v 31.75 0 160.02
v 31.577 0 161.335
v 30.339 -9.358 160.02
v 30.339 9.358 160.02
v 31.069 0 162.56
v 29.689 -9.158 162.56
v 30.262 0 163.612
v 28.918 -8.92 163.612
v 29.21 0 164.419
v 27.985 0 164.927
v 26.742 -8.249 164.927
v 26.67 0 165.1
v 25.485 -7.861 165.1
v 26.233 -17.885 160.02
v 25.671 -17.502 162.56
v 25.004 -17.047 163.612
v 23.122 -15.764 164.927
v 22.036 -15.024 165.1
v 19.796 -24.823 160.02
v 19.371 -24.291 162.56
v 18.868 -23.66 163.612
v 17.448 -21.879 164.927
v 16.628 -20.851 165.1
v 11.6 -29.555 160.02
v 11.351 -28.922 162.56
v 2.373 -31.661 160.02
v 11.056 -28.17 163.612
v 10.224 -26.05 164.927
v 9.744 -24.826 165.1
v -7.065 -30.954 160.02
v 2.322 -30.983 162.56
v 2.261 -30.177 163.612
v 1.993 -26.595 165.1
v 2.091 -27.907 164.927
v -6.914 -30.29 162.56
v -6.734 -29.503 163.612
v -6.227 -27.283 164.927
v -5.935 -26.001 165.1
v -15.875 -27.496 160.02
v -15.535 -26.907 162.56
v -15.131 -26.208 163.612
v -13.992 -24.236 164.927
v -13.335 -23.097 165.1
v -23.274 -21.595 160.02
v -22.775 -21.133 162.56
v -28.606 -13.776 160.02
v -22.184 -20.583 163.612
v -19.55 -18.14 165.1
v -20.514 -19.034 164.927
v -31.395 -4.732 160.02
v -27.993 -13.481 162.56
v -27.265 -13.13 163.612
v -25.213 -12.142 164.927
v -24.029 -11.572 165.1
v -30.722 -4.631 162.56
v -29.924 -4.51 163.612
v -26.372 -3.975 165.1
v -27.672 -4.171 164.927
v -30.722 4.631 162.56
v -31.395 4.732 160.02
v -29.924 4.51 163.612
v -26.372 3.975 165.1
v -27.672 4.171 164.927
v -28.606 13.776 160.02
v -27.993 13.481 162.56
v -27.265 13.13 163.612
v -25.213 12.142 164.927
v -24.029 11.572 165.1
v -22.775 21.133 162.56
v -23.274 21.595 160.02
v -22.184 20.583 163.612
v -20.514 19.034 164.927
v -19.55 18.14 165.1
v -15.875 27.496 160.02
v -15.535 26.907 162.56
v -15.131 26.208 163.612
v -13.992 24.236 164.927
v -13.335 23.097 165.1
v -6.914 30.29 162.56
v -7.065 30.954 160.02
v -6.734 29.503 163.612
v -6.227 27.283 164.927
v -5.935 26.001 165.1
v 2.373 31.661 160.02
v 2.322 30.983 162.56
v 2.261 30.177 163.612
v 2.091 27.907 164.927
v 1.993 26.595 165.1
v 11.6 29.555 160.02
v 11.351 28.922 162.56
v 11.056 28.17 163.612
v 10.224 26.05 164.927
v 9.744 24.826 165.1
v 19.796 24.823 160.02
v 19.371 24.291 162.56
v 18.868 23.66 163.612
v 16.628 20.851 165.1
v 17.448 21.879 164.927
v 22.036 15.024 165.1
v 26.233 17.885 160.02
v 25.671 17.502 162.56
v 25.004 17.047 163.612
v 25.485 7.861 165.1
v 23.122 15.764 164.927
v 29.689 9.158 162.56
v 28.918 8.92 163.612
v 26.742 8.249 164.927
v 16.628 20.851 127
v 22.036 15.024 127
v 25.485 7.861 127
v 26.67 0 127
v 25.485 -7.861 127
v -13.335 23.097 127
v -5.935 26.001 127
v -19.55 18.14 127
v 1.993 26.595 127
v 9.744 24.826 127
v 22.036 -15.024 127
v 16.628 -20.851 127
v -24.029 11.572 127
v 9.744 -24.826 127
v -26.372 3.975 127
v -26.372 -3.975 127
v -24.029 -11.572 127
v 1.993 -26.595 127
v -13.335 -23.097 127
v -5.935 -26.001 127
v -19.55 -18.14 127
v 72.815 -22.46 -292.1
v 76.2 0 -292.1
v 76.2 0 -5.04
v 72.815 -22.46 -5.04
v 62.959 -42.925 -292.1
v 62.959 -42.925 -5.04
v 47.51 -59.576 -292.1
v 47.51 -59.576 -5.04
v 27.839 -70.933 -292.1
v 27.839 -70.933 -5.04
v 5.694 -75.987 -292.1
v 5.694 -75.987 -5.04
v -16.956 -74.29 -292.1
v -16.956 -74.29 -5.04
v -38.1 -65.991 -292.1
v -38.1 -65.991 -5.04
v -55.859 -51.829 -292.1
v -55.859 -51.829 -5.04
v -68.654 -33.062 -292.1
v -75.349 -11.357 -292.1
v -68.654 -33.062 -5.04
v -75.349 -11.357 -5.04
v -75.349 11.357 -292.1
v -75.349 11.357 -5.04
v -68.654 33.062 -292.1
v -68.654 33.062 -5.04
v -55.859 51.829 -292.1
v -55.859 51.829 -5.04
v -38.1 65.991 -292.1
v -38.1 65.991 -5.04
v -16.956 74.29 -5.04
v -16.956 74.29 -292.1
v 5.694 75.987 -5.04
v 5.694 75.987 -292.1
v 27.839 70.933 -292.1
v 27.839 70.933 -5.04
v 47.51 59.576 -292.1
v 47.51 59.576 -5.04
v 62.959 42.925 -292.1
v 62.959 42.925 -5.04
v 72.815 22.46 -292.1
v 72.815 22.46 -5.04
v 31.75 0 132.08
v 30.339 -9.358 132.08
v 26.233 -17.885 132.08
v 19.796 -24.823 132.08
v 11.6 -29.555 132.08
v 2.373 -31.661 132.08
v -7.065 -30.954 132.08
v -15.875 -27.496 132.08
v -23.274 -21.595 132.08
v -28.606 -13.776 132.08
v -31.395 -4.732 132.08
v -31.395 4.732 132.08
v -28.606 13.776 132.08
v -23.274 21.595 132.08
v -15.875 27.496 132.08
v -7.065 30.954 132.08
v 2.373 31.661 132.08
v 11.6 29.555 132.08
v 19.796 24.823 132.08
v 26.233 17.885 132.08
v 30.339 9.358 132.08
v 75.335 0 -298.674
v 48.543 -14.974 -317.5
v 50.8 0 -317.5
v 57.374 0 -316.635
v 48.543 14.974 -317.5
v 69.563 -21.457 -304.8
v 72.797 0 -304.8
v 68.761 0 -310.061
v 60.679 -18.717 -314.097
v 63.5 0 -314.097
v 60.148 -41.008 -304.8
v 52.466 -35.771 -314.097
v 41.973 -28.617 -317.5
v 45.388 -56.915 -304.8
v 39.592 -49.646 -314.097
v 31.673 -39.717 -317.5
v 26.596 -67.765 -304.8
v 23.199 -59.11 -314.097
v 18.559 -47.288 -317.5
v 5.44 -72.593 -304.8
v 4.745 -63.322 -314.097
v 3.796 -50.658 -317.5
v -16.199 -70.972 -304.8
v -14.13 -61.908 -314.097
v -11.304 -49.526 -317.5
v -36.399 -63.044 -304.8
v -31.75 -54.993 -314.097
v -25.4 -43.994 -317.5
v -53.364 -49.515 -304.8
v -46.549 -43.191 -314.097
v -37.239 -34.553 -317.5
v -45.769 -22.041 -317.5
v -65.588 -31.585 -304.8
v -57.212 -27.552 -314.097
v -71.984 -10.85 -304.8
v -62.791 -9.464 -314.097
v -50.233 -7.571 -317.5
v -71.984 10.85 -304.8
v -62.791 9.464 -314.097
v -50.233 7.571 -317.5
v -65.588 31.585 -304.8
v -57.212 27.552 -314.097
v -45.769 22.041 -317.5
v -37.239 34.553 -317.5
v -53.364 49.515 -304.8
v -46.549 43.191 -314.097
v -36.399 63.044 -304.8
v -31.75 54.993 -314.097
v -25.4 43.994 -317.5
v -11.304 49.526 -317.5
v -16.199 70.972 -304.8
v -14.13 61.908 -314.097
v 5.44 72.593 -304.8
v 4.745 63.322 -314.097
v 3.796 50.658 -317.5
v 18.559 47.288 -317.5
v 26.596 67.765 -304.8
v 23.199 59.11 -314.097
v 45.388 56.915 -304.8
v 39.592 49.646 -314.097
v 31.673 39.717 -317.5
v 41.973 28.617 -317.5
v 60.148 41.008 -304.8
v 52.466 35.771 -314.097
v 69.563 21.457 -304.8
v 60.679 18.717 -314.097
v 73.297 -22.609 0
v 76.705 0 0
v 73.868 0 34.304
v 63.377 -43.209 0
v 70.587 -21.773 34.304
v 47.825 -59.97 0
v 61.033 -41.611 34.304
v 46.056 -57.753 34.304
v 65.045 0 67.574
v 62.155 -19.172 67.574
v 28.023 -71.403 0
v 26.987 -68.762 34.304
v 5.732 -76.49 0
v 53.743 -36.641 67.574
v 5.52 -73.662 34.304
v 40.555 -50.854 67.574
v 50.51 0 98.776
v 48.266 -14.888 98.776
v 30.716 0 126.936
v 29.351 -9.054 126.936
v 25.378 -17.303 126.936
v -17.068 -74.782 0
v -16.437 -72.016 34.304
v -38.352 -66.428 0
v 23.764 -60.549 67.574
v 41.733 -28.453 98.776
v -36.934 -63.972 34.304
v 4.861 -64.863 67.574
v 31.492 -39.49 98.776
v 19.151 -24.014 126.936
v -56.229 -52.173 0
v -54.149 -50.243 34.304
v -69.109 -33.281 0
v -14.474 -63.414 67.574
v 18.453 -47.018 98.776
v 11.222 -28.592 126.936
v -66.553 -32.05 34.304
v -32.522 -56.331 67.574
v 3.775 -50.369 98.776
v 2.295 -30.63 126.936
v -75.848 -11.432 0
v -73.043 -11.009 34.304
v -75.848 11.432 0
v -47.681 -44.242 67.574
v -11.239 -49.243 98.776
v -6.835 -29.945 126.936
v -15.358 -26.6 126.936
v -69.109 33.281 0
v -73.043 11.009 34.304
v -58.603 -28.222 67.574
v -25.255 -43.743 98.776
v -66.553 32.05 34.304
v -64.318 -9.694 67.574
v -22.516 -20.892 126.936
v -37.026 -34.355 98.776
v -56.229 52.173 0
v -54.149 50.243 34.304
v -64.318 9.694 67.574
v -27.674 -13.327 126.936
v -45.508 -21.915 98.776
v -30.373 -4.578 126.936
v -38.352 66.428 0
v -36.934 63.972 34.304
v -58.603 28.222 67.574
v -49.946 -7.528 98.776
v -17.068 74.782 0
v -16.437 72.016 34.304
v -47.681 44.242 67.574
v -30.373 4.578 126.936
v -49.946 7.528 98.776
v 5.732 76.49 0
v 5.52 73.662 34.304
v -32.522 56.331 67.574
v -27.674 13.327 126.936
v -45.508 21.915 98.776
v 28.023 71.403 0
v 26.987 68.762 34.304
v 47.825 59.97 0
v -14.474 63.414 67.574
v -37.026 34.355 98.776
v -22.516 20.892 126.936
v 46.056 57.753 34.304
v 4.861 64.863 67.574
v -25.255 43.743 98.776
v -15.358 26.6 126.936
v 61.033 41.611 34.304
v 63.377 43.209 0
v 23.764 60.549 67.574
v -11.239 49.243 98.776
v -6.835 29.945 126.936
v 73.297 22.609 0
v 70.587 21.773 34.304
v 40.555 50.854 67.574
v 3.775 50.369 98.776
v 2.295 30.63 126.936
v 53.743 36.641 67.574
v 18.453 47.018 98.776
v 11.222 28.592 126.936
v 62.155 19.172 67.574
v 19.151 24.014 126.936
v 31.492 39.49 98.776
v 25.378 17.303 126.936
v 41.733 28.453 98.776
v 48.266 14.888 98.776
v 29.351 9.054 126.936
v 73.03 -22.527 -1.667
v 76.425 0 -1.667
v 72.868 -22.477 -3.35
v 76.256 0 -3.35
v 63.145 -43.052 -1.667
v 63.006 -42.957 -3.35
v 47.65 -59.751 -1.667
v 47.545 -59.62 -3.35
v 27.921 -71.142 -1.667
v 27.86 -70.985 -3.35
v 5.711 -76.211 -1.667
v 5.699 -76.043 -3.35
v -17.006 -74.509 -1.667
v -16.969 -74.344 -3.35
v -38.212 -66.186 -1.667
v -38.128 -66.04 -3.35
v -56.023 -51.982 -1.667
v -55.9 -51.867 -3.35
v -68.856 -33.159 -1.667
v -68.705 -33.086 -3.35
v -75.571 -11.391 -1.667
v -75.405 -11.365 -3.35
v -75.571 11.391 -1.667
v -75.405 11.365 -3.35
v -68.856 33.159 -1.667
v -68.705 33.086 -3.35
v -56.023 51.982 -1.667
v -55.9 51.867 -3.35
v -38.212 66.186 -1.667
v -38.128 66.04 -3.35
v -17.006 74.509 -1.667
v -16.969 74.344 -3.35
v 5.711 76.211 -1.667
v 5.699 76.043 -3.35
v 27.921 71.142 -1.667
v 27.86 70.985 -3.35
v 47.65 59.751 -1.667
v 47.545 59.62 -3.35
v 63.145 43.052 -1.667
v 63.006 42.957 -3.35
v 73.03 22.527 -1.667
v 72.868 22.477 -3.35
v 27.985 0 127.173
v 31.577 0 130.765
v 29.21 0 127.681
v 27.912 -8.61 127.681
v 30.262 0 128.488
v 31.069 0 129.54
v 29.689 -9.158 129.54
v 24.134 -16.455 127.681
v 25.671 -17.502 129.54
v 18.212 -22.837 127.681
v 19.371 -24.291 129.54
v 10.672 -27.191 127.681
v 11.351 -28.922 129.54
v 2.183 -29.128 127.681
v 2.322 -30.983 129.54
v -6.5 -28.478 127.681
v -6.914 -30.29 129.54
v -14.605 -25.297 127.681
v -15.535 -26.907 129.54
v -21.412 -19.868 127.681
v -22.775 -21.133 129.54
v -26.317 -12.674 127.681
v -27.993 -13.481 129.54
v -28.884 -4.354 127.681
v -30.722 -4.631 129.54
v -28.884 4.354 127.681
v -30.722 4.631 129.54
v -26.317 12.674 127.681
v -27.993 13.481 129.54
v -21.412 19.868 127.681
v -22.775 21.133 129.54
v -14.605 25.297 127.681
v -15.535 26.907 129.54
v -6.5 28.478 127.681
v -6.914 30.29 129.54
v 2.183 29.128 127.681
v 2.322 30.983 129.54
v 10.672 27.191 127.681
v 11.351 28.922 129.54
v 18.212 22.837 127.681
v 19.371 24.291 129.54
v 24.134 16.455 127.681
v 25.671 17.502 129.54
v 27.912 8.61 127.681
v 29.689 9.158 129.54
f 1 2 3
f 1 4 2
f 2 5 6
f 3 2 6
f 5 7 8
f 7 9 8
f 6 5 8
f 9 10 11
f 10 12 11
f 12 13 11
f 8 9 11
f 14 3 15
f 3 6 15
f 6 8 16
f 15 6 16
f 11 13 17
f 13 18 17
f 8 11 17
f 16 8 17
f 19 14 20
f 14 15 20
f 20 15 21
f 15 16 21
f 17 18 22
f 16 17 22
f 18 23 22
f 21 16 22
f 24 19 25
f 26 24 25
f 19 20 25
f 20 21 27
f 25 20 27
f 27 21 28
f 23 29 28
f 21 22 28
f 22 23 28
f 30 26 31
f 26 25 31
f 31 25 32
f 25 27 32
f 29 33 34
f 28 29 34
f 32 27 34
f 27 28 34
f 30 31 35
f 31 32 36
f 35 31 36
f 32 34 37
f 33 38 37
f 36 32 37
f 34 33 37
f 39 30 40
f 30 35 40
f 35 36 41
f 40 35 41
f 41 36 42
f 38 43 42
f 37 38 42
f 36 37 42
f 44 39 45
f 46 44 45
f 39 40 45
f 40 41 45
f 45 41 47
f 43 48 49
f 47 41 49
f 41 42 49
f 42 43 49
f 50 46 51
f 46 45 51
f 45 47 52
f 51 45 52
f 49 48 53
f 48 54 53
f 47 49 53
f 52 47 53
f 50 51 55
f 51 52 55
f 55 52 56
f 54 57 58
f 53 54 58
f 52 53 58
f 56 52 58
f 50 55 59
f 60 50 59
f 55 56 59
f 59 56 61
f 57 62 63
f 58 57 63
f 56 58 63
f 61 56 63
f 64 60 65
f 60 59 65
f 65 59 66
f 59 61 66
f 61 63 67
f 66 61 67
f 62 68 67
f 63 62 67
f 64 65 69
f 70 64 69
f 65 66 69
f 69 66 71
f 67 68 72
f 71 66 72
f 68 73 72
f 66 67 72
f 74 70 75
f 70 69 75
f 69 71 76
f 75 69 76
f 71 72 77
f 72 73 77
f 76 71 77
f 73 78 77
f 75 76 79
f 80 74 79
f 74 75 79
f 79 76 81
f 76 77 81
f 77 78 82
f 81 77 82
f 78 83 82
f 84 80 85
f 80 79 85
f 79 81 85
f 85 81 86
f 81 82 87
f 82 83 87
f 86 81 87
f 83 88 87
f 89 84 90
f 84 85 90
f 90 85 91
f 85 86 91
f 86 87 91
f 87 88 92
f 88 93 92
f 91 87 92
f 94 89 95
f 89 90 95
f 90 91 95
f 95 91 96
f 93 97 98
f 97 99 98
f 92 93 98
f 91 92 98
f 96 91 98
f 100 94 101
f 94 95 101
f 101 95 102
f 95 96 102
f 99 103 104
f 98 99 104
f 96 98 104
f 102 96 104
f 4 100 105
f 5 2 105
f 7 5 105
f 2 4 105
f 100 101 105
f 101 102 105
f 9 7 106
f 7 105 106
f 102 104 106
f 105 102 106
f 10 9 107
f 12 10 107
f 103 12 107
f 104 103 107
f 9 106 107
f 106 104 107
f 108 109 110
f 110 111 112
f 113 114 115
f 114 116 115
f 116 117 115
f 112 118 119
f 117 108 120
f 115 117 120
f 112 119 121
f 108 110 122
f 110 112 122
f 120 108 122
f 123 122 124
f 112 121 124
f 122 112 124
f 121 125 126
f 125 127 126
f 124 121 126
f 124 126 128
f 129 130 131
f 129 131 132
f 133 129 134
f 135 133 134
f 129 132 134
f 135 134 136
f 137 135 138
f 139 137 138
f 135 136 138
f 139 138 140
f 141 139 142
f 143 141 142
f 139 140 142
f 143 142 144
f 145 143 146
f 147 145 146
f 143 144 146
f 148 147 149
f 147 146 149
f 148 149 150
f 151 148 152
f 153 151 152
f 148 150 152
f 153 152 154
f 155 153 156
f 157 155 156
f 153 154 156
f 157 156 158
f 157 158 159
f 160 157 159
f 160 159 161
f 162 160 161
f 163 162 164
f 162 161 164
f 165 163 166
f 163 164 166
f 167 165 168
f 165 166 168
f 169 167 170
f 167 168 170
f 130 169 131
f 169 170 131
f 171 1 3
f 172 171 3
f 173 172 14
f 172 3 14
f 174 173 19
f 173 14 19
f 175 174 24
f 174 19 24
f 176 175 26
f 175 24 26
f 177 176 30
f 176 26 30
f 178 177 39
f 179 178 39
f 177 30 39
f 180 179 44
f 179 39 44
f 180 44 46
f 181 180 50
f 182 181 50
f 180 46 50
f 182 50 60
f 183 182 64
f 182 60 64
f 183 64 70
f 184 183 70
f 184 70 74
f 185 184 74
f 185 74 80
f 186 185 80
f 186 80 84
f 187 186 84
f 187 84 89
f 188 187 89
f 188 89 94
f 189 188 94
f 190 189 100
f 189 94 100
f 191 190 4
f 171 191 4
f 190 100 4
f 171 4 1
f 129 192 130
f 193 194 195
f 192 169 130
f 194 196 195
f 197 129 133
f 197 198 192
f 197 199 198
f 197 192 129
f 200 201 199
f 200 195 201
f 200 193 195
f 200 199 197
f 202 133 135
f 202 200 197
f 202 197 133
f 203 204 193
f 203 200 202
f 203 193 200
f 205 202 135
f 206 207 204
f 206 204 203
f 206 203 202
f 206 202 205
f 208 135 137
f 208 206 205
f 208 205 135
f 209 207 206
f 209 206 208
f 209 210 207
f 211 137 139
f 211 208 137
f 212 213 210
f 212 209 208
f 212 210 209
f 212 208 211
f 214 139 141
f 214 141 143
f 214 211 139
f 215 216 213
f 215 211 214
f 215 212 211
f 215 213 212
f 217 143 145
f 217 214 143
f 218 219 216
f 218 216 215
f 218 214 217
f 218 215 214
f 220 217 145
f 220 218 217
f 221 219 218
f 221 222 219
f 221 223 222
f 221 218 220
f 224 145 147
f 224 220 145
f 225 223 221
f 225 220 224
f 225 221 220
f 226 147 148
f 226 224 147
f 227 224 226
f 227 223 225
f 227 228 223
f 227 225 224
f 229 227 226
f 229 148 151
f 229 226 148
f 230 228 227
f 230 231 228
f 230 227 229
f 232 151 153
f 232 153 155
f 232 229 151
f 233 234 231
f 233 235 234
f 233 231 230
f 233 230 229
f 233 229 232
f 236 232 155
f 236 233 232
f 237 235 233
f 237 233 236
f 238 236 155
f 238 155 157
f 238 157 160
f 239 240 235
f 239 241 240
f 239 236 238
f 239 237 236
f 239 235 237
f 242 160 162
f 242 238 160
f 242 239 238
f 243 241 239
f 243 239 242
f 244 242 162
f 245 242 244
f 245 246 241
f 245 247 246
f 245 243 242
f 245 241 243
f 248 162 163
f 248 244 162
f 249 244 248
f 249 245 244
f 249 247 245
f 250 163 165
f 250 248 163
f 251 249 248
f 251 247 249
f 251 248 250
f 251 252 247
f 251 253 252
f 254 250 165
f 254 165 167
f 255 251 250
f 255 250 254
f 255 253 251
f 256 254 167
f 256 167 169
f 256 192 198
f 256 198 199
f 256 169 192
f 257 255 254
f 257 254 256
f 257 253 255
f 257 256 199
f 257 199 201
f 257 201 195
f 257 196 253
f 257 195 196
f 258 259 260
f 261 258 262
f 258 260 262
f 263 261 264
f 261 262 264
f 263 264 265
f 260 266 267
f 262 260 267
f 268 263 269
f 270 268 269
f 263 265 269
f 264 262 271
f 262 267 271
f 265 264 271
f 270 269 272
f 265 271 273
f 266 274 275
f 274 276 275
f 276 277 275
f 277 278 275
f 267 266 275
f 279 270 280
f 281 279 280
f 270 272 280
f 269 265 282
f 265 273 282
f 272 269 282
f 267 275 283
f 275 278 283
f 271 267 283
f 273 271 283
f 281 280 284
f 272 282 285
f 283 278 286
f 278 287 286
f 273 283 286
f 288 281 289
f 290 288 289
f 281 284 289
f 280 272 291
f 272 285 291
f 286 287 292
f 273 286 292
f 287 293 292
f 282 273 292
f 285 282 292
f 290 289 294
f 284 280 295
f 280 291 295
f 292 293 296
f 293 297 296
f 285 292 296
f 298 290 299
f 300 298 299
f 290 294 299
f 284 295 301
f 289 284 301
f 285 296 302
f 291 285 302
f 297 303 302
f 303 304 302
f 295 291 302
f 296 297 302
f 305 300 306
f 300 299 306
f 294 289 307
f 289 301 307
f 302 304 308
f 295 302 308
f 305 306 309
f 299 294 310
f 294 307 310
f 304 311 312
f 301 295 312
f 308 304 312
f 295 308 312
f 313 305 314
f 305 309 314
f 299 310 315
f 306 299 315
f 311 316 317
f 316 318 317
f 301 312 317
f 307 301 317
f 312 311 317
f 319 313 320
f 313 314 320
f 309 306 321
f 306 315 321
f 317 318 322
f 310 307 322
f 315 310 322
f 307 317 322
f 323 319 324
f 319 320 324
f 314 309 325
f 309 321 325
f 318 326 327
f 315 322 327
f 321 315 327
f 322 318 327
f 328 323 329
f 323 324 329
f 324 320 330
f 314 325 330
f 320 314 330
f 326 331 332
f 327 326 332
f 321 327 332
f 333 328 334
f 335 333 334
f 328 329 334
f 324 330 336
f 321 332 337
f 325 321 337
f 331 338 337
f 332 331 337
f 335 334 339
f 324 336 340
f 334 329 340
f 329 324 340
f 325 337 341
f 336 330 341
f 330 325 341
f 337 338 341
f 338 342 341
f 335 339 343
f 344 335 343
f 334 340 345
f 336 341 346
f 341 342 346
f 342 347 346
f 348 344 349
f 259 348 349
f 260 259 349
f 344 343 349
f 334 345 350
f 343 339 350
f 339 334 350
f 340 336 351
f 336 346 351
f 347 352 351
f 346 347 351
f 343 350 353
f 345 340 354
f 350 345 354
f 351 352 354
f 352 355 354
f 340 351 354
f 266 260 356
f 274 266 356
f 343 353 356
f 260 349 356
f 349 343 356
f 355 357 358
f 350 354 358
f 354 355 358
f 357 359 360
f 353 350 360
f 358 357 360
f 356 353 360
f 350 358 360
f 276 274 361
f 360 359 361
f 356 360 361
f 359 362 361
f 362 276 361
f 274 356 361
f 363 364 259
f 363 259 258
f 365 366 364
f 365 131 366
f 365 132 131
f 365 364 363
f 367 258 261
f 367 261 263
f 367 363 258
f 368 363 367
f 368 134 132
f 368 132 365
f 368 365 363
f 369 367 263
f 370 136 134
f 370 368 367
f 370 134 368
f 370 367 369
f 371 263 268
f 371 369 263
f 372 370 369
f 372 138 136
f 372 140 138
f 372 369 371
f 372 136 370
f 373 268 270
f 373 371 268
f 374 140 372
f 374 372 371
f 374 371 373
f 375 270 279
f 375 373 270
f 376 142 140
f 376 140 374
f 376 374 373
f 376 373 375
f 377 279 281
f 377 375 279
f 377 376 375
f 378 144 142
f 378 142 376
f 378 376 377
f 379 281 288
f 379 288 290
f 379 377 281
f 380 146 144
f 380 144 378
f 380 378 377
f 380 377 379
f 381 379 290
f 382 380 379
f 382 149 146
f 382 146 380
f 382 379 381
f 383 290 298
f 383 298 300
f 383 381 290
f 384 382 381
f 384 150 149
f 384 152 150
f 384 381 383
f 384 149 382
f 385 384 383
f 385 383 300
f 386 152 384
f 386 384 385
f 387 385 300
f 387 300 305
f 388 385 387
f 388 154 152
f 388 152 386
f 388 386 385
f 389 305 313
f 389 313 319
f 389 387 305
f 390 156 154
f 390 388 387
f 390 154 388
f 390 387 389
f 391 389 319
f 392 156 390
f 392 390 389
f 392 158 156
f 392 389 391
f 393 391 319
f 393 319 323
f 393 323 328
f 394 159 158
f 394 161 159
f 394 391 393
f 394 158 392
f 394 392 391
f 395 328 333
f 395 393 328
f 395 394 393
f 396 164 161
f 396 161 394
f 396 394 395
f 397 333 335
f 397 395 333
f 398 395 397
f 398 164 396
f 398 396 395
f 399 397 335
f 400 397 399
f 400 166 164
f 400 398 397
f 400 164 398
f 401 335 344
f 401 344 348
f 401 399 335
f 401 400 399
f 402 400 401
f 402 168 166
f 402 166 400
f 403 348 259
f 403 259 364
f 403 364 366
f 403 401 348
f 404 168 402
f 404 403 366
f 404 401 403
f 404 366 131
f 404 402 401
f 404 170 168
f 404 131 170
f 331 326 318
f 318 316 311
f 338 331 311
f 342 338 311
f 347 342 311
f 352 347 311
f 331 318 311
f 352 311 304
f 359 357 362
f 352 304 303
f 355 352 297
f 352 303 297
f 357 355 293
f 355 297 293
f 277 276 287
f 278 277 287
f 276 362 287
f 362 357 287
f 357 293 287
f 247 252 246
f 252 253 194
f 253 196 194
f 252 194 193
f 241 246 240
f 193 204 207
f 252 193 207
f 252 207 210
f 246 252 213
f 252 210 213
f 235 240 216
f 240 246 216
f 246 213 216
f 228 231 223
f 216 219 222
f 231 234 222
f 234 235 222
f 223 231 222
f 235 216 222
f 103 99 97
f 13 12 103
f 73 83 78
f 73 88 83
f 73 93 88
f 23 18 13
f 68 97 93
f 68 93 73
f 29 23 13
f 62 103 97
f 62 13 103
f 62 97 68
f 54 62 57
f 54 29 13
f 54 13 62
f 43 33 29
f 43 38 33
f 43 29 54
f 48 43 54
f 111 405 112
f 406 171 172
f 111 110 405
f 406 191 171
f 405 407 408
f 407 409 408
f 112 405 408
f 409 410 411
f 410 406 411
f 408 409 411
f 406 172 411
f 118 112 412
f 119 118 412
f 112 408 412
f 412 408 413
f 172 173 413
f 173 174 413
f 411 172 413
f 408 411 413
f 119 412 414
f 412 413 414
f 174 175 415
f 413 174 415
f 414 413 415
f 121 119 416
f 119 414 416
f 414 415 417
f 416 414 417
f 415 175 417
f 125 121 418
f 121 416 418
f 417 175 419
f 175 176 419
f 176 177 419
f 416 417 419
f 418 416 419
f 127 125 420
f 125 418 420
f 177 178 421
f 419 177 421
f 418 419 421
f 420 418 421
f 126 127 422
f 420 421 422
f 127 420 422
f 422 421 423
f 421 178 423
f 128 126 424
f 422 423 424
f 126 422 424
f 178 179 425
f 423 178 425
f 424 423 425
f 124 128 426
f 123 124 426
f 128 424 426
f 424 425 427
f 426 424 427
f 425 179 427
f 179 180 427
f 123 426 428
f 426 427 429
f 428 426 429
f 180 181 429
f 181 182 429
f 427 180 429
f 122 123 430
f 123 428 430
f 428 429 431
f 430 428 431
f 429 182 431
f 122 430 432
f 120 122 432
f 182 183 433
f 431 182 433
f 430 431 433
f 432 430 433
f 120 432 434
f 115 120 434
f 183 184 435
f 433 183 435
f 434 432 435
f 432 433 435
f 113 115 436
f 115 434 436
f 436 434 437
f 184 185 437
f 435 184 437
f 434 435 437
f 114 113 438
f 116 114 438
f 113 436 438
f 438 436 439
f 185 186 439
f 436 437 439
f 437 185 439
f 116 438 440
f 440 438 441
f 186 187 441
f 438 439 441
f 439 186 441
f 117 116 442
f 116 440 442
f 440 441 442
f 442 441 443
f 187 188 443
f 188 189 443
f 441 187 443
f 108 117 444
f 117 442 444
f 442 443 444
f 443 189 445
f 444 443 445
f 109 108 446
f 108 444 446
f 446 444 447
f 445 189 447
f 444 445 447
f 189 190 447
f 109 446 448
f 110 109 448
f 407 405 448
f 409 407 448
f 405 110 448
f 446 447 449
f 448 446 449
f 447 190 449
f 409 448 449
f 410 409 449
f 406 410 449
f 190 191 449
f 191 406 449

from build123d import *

# Parameters (mm, degrees)
F0_W = 76.2
F0_H = 317.5
F2_W = 31.75
F2_H = 38.1
F7_R = 5.08


# Not quite as in the source:
# - a fillet or chamfer that OpenCascade refuses, or shapes differently, is made with other operations: its cross-section is extruded or revolved along the edge and cut away or added


with BuildPart() as f1:
    # F0 (on Front) → F1 (revolve)
    with BuildSketch(Plane.XZ):
        with Locations((38.1, -158.75)):
            Rectangle(F0_W, F0_H)
    revolve(axis=Axis((0, 0, -158.75), (0, 0, -1)))

    # F4 (on Front) → F5 (revolve)
    with BuildSketch(Plane.XZ):
        with BuildLine():
            Line((30.7155977935, 126.9357353449), (0, 126.9357353449))
            Line((0, 126.9357353449), (0, 0))
            Line((0, 0), (76.7049640417, 0))
            ThreePointArc((76.7049640417, 0), (65.0449125042, 67.5744537485), (30.7155977935, 126.9357353449))
        make_face()
    revolve(axis=Axis((0, 0, 63.4678676724), (0, 0, -1)))

    # F6: fillet of radius 25.4 on 3 edges, made by hand

    # F6_s1 → F6_t2 (revolve)
    with BuildSketch(Plane.XZ):
        with BuildLine():
            ThreePointArc((76.7049640417, 0), (76.3265562958, -2.5071632184), (76.2, -5.0395619488))
            Line((76.2, -5.0395619488), (76.2, 0))
            Line((76.2, 0), (76.7049640417, 0))
        make_face()
    revolve(axis=Axis((0, 0, 0), (0, 0, -1)))

    # F6_s3 → F6_t4 (revolve, cut)
    with BuildSketch(Plane.XZ):
        with BuildLine():
            ThreePointArc((76.2, -292.1), (68.7605122421, -310.0605122421), (50.8, -317.5))
            Line((50.8, -317.5), (76.2, -317.5))
            Line((76.2, -317.5), (76.2, -292.1))
        make_face()
    revolve(axis=Axis((0, 0, -317.5), (0, 0, -1)), mode=Mode.SUBTRACT)


with BuildPart() as f3:
    # F2 (on Front) → F3 (revolve)
    with BuildSketch(Plane.XZ):
        with Locations((15.875, 146.05)):
            Rectangle(F2_W, F2_H)
    revolve(axis=Axis((0, 0, 146.05), (0, 0, -1)))

    # F7
    f7_edges = [f3.edges().sort_by_distance(p)[0] for p in [
        (-31.75, 0, 165.1),
        (-31.75, 0, 127),
        (31.75, 0, 146.05),
    ]]
    fillet(f7_edges, radius=F7_R)


solid = Compound([f1.part, f3.part])
